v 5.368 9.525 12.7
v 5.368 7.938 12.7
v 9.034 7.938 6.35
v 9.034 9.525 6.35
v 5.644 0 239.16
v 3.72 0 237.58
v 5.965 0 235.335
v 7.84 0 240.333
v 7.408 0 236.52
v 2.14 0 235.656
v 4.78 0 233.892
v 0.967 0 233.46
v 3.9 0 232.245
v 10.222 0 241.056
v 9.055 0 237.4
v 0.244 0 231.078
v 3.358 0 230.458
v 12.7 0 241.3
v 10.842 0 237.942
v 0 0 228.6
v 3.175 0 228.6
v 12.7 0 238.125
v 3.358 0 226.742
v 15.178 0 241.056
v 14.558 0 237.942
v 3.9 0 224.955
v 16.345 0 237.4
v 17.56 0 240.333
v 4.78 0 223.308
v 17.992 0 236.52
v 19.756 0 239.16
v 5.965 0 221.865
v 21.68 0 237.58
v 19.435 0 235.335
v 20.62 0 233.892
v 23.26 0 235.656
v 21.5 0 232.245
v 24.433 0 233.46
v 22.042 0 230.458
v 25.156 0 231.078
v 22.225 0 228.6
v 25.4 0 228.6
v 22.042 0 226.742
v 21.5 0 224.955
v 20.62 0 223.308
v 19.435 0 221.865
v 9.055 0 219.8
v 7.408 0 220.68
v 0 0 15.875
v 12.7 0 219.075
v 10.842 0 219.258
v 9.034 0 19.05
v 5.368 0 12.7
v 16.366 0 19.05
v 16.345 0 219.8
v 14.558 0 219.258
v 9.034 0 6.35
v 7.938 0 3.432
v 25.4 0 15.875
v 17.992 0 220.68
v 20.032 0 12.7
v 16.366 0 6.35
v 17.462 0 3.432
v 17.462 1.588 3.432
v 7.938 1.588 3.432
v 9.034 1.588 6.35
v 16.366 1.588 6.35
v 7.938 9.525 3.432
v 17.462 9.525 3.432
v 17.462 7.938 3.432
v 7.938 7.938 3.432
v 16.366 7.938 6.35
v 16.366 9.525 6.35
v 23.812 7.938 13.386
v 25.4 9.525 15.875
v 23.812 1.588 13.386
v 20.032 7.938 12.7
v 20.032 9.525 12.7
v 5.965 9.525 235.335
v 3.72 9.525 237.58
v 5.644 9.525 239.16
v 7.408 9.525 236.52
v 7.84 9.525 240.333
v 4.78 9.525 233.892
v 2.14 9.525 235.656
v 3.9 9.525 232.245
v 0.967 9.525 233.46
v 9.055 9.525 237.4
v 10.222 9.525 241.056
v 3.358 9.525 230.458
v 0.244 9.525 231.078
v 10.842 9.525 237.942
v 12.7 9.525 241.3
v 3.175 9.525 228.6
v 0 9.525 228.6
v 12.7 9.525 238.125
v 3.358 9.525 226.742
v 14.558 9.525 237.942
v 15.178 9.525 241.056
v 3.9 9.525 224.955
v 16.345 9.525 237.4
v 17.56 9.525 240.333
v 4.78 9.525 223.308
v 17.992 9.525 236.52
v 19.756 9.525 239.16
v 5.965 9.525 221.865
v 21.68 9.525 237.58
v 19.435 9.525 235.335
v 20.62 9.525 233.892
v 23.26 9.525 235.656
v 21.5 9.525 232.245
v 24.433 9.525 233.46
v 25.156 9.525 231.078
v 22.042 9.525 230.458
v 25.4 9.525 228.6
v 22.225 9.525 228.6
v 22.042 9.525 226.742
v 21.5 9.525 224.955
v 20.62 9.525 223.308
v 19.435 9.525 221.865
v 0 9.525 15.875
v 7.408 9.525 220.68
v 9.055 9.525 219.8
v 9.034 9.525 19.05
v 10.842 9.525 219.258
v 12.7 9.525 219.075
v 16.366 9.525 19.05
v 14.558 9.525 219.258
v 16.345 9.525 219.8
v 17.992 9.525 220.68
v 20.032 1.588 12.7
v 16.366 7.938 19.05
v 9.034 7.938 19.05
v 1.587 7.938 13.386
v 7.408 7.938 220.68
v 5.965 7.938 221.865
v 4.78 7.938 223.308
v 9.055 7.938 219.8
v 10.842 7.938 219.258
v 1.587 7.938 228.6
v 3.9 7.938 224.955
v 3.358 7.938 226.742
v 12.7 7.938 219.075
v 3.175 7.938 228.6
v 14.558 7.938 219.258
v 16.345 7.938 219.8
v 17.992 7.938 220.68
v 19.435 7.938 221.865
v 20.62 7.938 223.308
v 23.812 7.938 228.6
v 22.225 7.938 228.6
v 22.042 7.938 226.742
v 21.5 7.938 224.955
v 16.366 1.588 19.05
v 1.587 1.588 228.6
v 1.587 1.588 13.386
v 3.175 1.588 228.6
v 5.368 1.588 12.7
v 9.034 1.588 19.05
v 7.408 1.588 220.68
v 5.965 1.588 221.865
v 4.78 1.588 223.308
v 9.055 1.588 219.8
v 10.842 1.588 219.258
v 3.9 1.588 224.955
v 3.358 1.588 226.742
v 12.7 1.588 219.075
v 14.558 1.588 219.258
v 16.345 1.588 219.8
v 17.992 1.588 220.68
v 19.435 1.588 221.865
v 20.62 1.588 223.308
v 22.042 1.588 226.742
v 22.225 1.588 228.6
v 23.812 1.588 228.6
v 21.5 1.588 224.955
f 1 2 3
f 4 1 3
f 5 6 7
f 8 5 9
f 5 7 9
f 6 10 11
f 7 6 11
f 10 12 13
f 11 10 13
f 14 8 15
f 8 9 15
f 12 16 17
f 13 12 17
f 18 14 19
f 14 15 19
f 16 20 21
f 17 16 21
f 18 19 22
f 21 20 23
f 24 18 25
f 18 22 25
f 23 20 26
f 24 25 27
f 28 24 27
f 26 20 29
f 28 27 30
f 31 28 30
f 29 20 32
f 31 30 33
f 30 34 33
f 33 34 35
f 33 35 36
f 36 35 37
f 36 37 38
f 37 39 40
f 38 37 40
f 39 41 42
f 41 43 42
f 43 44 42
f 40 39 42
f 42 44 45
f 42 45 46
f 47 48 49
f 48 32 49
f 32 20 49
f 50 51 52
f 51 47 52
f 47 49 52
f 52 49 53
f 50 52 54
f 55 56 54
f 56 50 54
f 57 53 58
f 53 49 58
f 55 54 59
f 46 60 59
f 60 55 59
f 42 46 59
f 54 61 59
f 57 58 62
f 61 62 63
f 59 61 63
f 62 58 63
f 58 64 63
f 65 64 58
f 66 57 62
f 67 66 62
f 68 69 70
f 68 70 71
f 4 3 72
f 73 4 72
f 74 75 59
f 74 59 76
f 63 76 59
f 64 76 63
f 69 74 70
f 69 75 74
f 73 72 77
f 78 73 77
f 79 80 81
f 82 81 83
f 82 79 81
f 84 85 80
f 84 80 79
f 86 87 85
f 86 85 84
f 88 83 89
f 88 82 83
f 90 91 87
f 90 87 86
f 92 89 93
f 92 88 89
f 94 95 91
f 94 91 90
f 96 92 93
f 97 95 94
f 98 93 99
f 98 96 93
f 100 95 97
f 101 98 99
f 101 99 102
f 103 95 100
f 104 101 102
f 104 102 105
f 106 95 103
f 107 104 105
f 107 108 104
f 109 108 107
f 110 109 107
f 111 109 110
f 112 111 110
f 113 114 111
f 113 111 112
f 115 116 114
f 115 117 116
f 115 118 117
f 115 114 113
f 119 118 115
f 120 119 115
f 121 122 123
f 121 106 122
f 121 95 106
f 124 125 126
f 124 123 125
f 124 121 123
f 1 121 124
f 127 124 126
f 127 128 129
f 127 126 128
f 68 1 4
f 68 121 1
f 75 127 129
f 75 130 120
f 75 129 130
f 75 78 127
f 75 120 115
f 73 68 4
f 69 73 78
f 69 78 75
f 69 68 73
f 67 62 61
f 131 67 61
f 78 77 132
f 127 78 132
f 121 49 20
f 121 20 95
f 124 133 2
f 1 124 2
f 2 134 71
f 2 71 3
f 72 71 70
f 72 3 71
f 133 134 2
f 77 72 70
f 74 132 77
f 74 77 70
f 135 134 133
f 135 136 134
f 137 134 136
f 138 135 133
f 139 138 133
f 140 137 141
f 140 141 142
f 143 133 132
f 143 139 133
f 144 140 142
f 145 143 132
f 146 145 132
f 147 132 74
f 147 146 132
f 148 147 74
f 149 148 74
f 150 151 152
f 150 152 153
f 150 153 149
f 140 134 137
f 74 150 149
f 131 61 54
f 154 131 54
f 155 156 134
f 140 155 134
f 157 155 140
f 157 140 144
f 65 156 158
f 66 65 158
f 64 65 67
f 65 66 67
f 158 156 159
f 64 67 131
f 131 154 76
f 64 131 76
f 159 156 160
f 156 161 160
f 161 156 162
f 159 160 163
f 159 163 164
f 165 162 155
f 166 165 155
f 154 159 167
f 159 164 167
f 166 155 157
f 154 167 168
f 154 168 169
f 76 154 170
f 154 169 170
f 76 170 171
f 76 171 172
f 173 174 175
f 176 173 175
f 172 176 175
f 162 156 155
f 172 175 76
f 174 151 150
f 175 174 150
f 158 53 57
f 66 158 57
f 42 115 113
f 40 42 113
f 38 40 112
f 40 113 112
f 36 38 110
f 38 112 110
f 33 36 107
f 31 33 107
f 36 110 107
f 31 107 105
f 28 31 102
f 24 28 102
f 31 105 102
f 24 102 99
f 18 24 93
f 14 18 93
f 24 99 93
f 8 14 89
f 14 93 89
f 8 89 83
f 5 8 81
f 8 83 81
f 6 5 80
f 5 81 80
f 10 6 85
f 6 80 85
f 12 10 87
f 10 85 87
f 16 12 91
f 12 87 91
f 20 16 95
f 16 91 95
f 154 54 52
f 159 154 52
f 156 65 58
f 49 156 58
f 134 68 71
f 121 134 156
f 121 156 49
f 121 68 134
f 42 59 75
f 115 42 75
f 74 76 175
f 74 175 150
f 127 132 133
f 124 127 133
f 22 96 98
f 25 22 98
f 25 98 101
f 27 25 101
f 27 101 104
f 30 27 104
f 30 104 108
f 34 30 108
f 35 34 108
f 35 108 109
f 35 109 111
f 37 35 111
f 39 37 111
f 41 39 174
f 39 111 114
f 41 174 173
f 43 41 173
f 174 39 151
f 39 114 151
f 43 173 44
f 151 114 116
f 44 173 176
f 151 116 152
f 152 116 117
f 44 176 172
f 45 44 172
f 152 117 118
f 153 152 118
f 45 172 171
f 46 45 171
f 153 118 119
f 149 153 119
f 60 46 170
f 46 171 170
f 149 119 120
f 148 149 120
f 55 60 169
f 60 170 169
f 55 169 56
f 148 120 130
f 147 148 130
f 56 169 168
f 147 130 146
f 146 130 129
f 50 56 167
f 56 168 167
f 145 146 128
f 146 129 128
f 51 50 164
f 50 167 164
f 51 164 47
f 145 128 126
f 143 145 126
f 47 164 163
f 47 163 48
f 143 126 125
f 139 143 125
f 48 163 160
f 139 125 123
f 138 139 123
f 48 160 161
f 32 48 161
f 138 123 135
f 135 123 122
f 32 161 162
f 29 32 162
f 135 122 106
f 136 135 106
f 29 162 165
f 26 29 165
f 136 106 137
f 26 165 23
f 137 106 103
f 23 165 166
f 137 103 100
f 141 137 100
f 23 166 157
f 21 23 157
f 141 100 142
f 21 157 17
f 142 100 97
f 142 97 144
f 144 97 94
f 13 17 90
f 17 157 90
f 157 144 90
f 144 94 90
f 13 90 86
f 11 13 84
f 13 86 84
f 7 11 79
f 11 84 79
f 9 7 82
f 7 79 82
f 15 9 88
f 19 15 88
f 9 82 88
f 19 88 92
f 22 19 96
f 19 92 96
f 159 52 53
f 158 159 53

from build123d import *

# Parameters (mm, degrees)
SKETCH1_W           = 25.4
SKETCH1_H           = 9.525
BOSS_EXTRUDE1_DEPTH = 228.6
SKETCH2_W           = 22.225
SKETCH2_H           = 6.35
CUT_EXTRUDE1_DEPTH  = 231.203921828
CUT_EXTRUDE2_DEPTH  = 231.203921828
CUT_EXTRUDE3_DEPTH  = 231.203921828
BOSS_EXTRUDE2_DEPTH = 9.525
SKETCH6_R           = 9.525
CUT_EXTRUDE4_DEPTH  = 9.525


with BuildPart() as part:
    # Sketch1 → Boss-Extrude1 (new body)
    with BuildSketch(Plane.XY):
        with Locations((12.7, 4.7625)):
            Rectangle(SKETCH1_W, SKETCH1_H)
    extrude(amount=BOSS_EXTRUDE1_DEPTH)

    # Sketch2 → Cut-Extrude1 (cut, through all)
    with BuildSketch(Plane.XY.offset(228.6)):
        with Locations((12.7, 4.7625)):
            Rectangle(SKETCH2_W, SKETCH2_H)
    extrude(amount=-CUT_EXTRUDE1_DEPTH, mode=Mode.SUBTRACT)

    # Sketch3 → Cut-Extrude2 (cut, through all)
    with BuildSketch(Plane.XZ):
        Polygon((20.032348419, 12.7), (16.366174209, 19.05), (9.033825791, 19.05), (5.367651581, 12.7), (9.033825791, 6.35), (16.366174209, 6.35), align=None)
    extrude(amount=-CUT_EXTRUDE2_DEPTH, mode=Mode.SUBTRACT)

    # Sketch4 → Cut-Extrude3 (cut, through all)
    with BuildSketch(Plane(origin=(0, 9.525, 0), x_dir=(1, 0, 0), z_dir=(0, 1, 0))):
        Polygon((25.4, -15.875), (17.4625, -3.432478139), (7.9375, -3.432478139), (0, -15.875), (0, 0), (25.4, 0), align=None)
    extrude(amount=-CUT_EXTRUDE3_DEPTH, mode=Mode.SUBTRACT)

    # Sketch5 → Boss-Extrude2 (add)
    with BuildSketch(Plane(origin=(0, 9.525, 0), x_dir=(1, 0, 0), z_dir=(0, 1, 0))):
        with BuildLine():
            Line((0, -228.6), (25.4, -228.6))
            ThreePointArc((25.4, -228.6), (12.7, -241.3), (0, -228.6))
        make_face()
    extrude(amount=-BOSS_EXTRUDE2_DEPTH)

    # Sketch6 → Cut-Extrude4 (cut)
    with BuildSketch(Plane(origin=(0, 9.525, 0), x_dir=(1, 0, 0), z_dir=(0, 1, 0))):
        with Locations(Location((12.7, -228.6, 0), (0, 0, 270))):
            Circle(SKETCH6_R)
    extrude(amount=-CUT_EXTRUDE4_DEPTH, mode=Mode.SUBTRACT)


solid = part.part
